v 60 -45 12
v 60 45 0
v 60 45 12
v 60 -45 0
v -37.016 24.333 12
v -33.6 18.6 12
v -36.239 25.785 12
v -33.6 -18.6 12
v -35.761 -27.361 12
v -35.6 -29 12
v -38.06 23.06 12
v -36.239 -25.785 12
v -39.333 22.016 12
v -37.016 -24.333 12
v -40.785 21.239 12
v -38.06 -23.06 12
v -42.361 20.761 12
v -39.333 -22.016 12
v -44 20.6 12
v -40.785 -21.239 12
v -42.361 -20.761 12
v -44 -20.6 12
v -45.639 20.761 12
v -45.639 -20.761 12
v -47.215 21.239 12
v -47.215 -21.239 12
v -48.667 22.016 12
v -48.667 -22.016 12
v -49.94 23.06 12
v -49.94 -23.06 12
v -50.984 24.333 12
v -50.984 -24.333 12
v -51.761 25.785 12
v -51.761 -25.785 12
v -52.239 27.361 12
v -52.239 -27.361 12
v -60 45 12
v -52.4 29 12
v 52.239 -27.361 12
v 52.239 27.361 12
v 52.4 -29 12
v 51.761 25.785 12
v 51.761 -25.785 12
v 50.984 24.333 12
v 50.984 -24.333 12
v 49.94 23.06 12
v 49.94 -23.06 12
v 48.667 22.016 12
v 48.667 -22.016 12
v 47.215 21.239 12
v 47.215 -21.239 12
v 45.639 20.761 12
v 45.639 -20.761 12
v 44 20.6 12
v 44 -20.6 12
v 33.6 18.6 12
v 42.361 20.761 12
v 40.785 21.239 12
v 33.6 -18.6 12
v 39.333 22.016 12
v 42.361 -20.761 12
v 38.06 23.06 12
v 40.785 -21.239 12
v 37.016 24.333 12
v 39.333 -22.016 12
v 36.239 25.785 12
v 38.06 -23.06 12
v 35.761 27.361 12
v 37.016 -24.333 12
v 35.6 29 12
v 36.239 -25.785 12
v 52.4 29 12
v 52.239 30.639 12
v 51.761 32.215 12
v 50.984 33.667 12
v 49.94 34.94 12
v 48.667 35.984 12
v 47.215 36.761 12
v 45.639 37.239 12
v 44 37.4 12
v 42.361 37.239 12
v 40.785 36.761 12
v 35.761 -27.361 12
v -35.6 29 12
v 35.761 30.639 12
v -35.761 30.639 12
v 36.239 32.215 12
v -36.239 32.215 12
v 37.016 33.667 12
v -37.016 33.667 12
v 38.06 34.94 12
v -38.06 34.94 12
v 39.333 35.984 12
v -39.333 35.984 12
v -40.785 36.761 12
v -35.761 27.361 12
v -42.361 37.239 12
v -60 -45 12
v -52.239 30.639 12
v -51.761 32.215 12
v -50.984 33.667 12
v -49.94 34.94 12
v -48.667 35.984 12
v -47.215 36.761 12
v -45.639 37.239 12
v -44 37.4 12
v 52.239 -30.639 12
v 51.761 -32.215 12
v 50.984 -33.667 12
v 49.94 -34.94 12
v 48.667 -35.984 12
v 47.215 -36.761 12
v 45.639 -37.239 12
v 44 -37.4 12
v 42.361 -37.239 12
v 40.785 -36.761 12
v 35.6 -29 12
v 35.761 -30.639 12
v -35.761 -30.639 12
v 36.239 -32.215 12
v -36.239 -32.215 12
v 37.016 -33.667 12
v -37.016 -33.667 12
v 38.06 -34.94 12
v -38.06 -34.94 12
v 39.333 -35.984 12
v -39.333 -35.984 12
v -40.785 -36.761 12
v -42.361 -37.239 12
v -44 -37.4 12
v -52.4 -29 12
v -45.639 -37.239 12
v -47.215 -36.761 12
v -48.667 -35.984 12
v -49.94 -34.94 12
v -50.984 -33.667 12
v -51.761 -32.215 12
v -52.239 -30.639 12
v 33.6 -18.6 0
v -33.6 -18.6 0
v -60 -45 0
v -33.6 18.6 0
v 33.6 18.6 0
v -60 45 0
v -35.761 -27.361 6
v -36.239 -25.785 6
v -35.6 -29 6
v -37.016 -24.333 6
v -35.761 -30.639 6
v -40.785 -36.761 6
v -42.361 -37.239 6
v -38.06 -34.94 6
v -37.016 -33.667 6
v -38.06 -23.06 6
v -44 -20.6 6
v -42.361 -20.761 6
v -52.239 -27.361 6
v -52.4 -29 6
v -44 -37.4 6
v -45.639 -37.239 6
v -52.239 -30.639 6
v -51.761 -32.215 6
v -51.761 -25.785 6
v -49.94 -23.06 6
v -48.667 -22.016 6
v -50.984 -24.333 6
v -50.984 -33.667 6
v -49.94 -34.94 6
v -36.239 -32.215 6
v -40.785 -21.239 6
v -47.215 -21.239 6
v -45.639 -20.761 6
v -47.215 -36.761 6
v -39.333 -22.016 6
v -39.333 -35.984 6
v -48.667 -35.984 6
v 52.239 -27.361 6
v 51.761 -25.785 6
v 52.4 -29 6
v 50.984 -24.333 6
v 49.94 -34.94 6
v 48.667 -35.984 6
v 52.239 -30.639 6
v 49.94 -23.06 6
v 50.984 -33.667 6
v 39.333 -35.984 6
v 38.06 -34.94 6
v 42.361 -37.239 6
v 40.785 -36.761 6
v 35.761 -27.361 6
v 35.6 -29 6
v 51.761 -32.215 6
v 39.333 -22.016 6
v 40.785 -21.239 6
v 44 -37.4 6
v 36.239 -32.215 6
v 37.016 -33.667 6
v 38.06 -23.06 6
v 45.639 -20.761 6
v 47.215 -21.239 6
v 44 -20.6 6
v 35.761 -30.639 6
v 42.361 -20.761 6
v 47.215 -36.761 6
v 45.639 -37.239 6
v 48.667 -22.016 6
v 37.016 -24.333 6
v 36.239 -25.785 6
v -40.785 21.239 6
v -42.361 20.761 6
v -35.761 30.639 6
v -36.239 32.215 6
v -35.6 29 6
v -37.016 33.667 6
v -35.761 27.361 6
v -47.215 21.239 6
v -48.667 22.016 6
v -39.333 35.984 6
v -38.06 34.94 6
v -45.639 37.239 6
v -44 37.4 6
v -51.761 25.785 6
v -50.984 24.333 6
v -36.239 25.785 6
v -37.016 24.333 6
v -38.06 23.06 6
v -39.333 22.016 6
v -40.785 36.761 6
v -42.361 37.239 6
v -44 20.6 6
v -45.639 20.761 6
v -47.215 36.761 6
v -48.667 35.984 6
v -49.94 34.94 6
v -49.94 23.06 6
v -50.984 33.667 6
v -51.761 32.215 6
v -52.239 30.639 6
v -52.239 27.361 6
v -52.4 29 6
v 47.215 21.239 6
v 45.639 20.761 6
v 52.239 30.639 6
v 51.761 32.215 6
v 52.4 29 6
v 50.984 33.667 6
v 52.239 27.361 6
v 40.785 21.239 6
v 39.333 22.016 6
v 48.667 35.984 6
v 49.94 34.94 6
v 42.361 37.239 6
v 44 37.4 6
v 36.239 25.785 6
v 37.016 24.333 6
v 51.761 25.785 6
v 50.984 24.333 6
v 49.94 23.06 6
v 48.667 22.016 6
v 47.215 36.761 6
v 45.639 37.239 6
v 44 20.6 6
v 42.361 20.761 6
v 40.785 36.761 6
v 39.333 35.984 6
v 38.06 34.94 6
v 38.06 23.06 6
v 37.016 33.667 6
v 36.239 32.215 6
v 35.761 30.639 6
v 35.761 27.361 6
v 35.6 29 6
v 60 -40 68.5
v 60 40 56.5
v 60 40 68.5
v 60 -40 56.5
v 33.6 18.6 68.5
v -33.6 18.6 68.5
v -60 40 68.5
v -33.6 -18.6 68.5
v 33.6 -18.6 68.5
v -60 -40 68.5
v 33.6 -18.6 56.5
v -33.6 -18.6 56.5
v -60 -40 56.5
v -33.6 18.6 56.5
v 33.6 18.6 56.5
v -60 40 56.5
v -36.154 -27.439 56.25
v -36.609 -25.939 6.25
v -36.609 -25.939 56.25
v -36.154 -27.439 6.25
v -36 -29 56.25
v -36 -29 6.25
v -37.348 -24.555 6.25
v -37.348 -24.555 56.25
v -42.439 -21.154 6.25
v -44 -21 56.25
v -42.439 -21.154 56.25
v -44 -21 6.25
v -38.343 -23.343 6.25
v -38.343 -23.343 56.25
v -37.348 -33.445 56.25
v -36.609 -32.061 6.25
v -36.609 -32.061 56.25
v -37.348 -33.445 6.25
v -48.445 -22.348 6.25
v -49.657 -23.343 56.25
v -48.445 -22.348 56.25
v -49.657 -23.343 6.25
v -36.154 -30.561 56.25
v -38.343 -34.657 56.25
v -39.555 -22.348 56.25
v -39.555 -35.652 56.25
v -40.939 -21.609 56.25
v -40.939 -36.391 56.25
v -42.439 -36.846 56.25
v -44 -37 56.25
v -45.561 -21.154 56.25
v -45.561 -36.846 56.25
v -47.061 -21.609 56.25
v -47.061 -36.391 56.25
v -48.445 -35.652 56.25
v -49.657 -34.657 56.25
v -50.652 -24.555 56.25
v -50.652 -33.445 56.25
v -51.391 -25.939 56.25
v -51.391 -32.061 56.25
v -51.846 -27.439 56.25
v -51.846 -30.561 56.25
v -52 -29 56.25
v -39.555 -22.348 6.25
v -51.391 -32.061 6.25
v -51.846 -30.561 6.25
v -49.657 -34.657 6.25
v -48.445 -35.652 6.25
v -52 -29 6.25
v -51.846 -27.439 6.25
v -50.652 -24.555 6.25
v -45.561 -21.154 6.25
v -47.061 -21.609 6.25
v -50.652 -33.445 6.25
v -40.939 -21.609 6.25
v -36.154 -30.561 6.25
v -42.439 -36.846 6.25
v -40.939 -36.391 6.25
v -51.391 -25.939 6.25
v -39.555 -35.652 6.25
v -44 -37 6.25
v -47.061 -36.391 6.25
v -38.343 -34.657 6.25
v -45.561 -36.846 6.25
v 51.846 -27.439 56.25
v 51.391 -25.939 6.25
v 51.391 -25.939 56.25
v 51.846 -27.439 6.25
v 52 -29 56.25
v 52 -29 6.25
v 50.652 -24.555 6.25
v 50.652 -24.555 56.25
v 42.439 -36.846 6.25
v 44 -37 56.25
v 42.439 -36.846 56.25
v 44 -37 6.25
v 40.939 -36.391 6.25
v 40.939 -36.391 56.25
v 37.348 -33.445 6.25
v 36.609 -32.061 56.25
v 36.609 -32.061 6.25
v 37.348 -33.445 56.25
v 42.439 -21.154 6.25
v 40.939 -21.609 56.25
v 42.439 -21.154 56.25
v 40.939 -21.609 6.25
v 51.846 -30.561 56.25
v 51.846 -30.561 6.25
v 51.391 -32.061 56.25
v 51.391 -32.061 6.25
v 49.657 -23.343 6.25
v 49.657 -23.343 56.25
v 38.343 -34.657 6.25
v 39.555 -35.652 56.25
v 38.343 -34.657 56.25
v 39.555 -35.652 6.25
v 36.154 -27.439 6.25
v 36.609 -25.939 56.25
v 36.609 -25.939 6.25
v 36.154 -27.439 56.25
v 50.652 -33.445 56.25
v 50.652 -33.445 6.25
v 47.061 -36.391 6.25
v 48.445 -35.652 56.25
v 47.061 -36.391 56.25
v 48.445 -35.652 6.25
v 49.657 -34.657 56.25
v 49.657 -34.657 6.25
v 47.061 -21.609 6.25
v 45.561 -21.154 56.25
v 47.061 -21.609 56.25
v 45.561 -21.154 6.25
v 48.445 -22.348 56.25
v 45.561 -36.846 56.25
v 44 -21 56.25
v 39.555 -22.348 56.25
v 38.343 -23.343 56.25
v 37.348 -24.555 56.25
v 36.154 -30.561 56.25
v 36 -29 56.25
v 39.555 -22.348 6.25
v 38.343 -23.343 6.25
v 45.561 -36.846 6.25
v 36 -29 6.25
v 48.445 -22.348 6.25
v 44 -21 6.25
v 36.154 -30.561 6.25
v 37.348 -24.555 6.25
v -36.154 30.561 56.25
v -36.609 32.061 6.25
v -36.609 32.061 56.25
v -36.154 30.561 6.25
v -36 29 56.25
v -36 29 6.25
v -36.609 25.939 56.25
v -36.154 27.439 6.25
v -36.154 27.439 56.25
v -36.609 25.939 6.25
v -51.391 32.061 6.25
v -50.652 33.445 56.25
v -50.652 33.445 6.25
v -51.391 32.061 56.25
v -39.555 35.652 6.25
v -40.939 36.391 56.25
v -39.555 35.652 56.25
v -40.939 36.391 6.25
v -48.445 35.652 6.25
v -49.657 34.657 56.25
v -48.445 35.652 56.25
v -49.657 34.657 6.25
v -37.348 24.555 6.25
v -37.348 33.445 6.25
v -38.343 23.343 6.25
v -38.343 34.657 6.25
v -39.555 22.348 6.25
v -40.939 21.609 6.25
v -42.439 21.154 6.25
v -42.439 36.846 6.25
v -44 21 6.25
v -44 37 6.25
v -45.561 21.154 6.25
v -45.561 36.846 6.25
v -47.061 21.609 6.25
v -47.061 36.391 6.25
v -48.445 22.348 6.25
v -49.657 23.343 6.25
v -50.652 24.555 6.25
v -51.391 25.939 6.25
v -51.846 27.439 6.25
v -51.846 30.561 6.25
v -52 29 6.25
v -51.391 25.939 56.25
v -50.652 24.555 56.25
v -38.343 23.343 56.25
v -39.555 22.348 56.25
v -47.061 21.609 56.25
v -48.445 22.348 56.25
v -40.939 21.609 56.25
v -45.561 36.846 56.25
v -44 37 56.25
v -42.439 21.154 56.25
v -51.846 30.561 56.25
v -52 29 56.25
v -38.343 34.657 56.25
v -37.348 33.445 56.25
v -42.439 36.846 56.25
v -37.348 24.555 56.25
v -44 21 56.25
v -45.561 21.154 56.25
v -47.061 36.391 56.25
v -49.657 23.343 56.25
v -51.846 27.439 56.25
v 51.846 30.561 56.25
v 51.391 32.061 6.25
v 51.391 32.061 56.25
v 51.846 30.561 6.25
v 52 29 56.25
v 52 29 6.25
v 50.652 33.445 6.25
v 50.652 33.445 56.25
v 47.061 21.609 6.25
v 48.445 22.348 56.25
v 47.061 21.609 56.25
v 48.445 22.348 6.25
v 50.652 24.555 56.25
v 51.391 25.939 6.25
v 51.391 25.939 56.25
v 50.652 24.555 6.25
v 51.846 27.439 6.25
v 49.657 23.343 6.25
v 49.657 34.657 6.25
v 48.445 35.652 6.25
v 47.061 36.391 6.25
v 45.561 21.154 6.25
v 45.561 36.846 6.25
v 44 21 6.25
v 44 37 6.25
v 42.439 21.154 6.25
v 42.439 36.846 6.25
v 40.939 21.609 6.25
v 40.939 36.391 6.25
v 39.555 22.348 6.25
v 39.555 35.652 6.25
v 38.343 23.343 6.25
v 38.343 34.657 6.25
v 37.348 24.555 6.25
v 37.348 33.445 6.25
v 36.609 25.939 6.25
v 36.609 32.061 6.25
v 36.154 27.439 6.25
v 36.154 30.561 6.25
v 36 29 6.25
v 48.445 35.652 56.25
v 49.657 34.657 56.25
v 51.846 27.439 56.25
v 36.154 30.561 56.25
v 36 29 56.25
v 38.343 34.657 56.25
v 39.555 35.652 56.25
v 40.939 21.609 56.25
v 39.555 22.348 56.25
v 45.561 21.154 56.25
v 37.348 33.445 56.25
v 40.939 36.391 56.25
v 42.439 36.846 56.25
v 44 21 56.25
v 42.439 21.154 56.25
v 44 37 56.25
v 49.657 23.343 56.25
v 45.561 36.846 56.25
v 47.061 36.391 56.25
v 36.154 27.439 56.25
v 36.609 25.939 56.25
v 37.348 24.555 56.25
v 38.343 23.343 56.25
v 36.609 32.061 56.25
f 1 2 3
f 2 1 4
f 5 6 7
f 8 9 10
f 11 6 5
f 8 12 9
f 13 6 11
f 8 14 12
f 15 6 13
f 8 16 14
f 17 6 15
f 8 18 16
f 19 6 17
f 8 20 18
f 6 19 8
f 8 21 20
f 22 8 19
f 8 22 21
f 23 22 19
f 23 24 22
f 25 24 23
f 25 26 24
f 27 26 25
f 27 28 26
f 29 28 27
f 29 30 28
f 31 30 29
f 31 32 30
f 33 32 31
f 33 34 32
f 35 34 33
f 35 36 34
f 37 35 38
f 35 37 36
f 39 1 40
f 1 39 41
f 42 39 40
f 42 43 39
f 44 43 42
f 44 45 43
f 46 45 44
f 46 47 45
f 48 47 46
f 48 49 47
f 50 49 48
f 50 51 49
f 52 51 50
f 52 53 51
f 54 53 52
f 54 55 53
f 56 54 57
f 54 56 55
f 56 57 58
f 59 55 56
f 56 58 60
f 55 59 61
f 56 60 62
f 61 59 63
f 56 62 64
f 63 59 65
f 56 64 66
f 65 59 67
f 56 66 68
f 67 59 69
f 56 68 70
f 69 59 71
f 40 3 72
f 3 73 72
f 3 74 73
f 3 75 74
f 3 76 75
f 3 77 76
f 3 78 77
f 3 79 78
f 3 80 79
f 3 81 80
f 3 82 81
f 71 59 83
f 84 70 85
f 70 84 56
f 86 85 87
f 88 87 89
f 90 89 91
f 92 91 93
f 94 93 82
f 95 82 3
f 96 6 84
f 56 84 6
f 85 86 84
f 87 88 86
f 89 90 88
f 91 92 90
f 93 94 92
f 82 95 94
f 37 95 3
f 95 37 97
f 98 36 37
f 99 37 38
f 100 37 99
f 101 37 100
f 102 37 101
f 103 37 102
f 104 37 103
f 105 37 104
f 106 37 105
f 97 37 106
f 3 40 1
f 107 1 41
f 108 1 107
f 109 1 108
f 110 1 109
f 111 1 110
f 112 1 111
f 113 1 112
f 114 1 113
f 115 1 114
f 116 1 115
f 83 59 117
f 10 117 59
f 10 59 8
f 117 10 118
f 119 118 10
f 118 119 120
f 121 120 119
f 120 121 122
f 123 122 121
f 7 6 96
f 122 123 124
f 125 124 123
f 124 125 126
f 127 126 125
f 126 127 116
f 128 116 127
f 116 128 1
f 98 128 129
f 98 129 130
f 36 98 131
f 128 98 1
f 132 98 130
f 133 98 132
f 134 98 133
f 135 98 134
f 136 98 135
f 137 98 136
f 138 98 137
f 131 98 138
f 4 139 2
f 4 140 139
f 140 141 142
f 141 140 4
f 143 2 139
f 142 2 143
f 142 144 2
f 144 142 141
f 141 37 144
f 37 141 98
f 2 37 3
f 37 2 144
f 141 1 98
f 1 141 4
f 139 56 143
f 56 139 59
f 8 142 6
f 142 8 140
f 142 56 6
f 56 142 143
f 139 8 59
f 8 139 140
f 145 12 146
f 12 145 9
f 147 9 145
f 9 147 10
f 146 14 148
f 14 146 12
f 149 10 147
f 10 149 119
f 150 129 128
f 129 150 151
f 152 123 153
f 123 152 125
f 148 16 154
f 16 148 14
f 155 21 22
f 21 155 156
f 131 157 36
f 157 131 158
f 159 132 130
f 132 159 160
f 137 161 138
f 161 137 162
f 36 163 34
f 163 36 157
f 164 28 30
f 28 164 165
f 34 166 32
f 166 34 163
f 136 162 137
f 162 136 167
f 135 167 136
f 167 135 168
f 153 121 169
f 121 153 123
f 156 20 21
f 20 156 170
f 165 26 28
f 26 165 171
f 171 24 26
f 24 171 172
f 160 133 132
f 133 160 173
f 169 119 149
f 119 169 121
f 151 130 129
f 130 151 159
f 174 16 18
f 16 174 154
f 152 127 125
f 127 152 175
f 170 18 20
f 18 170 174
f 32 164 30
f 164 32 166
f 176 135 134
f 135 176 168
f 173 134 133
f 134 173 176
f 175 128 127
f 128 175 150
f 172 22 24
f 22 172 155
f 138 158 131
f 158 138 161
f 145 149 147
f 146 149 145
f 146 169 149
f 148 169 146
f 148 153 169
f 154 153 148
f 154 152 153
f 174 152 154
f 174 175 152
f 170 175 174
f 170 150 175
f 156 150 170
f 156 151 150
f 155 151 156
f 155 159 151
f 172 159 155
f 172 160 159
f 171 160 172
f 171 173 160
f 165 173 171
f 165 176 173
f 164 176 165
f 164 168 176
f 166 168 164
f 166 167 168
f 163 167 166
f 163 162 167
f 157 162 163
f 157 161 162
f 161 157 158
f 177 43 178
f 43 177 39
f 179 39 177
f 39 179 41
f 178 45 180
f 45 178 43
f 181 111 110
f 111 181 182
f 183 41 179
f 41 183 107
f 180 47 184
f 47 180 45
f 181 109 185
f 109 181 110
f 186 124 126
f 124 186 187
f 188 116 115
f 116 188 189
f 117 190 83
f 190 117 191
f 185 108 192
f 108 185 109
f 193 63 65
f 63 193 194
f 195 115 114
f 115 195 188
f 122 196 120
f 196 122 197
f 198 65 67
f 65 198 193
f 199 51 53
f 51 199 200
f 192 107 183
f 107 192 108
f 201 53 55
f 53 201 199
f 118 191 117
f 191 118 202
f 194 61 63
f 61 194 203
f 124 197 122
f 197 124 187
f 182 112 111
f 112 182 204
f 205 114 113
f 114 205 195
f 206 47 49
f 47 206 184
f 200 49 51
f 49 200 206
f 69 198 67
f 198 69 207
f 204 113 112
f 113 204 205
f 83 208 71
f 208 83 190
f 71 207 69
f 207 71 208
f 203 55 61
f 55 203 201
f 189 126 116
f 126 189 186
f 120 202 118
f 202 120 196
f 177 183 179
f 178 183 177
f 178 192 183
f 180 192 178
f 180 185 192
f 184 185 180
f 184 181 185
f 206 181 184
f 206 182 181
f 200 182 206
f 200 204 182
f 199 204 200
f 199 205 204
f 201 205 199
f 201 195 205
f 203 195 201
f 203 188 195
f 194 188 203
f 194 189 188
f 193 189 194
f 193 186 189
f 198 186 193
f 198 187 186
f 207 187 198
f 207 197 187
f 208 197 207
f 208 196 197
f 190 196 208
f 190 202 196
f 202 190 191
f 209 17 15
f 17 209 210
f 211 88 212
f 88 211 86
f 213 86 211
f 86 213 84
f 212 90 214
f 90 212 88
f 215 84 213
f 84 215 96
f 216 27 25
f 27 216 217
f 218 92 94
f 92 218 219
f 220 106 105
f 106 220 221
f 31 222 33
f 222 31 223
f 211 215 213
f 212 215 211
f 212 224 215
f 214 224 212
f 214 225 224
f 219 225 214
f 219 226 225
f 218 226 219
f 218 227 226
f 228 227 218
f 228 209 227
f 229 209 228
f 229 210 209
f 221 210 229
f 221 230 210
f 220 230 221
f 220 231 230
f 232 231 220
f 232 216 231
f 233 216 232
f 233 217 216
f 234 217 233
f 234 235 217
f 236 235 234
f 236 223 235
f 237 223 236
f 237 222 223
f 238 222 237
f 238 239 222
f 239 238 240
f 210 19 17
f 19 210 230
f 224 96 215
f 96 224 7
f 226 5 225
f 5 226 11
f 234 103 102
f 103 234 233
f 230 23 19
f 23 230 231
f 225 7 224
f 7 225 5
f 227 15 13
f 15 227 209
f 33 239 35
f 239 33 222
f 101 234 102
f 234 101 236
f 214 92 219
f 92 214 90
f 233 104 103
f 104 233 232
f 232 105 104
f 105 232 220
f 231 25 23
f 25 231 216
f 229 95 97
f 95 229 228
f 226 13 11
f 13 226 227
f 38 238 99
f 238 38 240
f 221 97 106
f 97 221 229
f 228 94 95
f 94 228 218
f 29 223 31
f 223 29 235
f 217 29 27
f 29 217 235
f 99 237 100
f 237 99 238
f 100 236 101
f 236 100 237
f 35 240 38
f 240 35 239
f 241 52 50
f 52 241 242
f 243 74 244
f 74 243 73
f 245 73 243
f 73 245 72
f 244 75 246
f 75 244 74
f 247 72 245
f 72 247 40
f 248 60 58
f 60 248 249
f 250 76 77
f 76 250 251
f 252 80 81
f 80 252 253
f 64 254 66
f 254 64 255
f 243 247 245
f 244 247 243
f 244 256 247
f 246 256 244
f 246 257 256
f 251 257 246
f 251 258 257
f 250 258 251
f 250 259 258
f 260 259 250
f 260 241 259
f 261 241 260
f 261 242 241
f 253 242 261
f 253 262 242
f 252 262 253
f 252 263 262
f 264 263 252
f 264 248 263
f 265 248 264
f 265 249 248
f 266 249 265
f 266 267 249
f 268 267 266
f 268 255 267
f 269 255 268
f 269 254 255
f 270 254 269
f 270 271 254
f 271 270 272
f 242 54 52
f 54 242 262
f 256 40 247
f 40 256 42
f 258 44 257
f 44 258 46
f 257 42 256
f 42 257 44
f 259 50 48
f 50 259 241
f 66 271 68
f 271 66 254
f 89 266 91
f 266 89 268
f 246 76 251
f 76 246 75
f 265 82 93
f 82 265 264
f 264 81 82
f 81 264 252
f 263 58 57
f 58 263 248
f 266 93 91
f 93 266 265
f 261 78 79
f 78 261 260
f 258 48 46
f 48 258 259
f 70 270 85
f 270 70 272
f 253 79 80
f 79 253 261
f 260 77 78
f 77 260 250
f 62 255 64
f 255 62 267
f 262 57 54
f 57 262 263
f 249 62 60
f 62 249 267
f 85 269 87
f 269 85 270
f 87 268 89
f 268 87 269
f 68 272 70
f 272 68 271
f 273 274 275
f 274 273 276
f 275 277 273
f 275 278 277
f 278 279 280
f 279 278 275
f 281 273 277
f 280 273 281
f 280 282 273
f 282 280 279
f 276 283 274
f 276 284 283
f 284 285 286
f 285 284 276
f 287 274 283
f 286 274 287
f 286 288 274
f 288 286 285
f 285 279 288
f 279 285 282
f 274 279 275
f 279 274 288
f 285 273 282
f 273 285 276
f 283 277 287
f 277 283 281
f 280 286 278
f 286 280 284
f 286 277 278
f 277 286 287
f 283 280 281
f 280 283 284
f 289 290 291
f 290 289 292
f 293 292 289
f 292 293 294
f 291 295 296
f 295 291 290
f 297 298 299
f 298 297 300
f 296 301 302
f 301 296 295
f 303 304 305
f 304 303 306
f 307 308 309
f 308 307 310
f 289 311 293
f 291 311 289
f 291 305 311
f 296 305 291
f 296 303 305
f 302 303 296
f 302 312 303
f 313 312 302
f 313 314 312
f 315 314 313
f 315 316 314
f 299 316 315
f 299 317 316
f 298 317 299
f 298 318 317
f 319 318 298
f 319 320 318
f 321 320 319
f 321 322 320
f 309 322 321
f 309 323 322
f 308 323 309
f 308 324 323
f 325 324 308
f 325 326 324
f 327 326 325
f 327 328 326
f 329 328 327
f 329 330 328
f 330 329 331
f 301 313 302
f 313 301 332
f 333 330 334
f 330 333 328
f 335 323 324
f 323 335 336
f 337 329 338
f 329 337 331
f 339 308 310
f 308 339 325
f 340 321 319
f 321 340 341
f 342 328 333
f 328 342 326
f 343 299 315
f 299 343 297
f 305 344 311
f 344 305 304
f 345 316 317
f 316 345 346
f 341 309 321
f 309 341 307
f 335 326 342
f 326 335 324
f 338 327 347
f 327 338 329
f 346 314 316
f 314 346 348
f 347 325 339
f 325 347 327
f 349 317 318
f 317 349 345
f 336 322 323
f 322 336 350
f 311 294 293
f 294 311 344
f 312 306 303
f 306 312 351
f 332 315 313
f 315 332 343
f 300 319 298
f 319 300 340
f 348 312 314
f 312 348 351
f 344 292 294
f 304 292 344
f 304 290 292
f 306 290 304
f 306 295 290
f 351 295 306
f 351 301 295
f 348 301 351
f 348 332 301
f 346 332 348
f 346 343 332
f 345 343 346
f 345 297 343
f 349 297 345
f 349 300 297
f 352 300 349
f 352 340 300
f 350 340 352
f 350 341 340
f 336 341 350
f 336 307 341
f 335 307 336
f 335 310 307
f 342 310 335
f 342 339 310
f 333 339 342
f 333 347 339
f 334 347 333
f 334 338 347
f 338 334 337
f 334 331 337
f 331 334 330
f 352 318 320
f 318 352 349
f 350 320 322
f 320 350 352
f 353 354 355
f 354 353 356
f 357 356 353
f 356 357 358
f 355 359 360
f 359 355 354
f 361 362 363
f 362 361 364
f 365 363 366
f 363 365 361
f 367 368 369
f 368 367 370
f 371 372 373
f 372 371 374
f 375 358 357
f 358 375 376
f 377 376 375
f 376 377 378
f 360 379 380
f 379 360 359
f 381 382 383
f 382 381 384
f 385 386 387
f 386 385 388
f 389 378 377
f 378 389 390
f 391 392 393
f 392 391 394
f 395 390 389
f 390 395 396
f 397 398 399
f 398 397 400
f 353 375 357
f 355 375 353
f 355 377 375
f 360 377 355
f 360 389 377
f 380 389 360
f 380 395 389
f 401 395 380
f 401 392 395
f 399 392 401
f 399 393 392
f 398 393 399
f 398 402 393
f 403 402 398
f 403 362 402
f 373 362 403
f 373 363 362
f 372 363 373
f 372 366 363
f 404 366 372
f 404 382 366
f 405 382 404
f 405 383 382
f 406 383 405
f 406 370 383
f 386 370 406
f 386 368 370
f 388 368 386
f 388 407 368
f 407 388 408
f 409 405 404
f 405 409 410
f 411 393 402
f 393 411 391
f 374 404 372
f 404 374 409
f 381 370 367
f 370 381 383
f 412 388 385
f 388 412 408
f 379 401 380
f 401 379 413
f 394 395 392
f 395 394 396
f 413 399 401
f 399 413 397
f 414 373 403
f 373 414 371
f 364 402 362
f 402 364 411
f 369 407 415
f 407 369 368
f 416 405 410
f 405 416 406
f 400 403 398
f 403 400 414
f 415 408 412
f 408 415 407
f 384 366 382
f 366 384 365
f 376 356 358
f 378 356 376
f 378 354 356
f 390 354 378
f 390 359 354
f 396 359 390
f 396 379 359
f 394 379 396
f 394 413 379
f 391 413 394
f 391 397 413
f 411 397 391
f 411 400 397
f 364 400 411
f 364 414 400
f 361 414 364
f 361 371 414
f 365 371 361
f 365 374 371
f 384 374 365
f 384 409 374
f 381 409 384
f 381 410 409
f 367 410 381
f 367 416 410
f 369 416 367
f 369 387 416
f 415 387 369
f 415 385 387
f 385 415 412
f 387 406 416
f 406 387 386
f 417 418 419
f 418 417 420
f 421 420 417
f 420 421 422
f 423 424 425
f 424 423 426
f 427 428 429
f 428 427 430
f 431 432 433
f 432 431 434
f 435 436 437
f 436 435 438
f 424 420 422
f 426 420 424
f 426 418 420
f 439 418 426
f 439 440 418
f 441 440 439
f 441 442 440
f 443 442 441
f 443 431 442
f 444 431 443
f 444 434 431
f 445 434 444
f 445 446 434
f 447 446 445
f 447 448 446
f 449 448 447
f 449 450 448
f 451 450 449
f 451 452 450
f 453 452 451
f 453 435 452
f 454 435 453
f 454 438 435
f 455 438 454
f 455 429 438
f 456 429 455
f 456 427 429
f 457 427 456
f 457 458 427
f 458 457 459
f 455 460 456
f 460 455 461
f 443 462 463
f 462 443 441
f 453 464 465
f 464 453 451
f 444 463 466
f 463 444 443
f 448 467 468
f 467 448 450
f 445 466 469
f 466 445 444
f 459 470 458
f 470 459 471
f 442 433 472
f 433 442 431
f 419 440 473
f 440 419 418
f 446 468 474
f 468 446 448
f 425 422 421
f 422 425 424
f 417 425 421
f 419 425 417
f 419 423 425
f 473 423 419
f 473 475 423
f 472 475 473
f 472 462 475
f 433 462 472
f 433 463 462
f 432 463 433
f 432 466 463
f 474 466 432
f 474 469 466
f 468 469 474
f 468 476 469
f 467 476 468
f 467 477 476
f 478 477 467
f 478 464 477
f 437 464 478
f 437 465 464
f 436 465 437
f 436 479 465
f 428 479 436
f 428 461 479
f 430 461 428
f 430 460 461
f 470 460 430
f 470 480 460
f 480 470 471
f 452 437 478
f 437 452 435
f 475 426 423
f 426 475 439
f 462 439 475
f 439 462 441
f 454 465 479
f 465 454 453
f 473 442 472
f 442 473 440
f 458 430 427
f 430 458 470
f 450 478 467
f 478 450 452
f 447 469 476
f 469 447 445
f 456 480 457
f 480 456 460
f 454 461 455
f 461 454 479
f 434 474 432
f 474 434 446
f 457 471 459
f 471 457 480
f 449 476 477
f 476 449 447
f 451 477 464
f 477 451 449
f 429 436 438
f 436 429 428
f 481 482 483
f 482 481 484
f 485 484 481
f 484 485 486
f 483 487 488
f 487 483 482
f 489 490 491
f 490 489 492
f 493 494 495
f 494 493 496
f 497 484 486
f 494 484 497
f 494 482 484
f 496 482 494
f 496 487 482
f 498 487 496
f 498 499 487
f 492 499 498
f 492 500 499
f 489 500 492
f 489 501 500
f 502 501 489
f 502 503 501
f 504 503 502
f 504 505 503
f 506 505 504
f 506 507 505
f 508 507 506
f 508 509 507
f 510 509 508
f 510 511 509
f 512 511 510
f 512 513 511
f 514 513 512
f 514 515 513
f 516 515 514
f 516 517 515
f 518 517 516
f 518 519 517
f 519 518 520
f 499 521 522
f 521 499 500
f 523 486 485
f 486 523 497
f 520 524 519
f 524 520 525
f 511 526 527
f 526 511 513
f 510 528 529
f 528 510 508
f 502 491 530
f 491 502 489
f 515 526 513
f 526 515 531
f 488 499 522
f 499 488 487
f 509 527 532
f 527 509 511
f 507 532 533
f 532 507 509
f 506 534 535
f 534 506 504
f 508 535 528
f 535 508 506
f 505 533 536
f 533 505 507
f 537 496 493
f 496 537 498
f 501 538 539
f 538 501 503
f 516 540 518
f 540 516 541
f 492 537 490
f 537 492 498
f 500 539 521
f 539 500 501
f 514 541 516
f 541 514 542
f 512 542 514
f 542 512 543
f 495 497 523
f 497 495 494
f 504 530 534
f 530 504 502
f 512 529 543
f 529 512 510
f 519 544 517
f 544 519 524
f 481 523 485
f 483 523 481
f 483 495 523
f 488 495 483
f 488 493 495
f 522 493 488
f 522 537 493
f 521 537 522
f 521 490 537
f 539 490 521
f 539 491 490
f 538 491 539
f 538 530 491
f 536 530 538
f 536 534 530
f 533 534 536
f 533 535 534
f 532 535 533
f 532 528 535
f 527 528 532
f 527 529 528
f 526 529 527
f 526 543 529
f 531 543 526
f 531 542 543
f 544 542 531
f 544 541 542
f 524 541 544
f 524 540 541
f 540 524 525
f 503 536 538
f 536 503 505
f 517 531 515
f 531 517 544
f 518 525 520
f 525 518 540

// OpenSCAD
$fn = 32;

// ------------------------------------------------------------------------
// Frame cube: base 120 x 90 mm, posts 50 mm tall
// Every part is its own module, assembly() places every instance.
// ------------------------------------------------------------------------

// --- part 1 ---
module base_frame() {
  difference() {
    translate([-60, -45, 0]) cube([120, 90, 12]);
    translate([-33.6, -18.6, -1]) cube([67.2, 37.2, 14]);
    translate([-44, -29, 6]) cylinder(h = 7, d = 16.8);
    translate([44, -29, 6]) cylinder(h = 7, d = 16.8);
    translate([-44, 29, 6]) cylinder(h = 7, d = 16.8);
    translate([44, 29, 6]) cylinder(h = 7, d = 16.8);
  }
}

// --- part 2 ---
module corner_post() {
  cylinder(h = 50, d = 16);
}

// --- part 3 ---
module top_frame() {
  difference() {
    translate([-60, -40, 0]) cube([120, 80, 12]);
    translate([-33.6, -18.6, -1]) cube([67.2, 37.2, 14]);
  }
}

// --- assembly ---
module assembly() {
  color([0.80, 0.24, 0.20]) translate([0, 0, 0]) rotate([0, 0, 0]) base_frame();
  color([0.20, 0.45, 0.75]) translate([-44, -29, 6.25]) rotate([0, 0, 0]) corner_post();
  color([0.25, 0.62, 0.32]) translate([44, -29, 6.25]) rotate([0, 0, 0]) corner_post();
  color([0.92, 0.70, 0.18]) translate([-44, 29, 6.25]) rotate([0, 0, 0]) corner_post();
  color([0.58, 0.35, 0.70]) translate([44, 29, 6.25]) rotate([0, 0, 0]) corner_post();
  color([0.16, 0.66, 0.66]) translate([0, 0, 56.5]) rotate([0, 0, 0]) top_frame();
}

assembly();
